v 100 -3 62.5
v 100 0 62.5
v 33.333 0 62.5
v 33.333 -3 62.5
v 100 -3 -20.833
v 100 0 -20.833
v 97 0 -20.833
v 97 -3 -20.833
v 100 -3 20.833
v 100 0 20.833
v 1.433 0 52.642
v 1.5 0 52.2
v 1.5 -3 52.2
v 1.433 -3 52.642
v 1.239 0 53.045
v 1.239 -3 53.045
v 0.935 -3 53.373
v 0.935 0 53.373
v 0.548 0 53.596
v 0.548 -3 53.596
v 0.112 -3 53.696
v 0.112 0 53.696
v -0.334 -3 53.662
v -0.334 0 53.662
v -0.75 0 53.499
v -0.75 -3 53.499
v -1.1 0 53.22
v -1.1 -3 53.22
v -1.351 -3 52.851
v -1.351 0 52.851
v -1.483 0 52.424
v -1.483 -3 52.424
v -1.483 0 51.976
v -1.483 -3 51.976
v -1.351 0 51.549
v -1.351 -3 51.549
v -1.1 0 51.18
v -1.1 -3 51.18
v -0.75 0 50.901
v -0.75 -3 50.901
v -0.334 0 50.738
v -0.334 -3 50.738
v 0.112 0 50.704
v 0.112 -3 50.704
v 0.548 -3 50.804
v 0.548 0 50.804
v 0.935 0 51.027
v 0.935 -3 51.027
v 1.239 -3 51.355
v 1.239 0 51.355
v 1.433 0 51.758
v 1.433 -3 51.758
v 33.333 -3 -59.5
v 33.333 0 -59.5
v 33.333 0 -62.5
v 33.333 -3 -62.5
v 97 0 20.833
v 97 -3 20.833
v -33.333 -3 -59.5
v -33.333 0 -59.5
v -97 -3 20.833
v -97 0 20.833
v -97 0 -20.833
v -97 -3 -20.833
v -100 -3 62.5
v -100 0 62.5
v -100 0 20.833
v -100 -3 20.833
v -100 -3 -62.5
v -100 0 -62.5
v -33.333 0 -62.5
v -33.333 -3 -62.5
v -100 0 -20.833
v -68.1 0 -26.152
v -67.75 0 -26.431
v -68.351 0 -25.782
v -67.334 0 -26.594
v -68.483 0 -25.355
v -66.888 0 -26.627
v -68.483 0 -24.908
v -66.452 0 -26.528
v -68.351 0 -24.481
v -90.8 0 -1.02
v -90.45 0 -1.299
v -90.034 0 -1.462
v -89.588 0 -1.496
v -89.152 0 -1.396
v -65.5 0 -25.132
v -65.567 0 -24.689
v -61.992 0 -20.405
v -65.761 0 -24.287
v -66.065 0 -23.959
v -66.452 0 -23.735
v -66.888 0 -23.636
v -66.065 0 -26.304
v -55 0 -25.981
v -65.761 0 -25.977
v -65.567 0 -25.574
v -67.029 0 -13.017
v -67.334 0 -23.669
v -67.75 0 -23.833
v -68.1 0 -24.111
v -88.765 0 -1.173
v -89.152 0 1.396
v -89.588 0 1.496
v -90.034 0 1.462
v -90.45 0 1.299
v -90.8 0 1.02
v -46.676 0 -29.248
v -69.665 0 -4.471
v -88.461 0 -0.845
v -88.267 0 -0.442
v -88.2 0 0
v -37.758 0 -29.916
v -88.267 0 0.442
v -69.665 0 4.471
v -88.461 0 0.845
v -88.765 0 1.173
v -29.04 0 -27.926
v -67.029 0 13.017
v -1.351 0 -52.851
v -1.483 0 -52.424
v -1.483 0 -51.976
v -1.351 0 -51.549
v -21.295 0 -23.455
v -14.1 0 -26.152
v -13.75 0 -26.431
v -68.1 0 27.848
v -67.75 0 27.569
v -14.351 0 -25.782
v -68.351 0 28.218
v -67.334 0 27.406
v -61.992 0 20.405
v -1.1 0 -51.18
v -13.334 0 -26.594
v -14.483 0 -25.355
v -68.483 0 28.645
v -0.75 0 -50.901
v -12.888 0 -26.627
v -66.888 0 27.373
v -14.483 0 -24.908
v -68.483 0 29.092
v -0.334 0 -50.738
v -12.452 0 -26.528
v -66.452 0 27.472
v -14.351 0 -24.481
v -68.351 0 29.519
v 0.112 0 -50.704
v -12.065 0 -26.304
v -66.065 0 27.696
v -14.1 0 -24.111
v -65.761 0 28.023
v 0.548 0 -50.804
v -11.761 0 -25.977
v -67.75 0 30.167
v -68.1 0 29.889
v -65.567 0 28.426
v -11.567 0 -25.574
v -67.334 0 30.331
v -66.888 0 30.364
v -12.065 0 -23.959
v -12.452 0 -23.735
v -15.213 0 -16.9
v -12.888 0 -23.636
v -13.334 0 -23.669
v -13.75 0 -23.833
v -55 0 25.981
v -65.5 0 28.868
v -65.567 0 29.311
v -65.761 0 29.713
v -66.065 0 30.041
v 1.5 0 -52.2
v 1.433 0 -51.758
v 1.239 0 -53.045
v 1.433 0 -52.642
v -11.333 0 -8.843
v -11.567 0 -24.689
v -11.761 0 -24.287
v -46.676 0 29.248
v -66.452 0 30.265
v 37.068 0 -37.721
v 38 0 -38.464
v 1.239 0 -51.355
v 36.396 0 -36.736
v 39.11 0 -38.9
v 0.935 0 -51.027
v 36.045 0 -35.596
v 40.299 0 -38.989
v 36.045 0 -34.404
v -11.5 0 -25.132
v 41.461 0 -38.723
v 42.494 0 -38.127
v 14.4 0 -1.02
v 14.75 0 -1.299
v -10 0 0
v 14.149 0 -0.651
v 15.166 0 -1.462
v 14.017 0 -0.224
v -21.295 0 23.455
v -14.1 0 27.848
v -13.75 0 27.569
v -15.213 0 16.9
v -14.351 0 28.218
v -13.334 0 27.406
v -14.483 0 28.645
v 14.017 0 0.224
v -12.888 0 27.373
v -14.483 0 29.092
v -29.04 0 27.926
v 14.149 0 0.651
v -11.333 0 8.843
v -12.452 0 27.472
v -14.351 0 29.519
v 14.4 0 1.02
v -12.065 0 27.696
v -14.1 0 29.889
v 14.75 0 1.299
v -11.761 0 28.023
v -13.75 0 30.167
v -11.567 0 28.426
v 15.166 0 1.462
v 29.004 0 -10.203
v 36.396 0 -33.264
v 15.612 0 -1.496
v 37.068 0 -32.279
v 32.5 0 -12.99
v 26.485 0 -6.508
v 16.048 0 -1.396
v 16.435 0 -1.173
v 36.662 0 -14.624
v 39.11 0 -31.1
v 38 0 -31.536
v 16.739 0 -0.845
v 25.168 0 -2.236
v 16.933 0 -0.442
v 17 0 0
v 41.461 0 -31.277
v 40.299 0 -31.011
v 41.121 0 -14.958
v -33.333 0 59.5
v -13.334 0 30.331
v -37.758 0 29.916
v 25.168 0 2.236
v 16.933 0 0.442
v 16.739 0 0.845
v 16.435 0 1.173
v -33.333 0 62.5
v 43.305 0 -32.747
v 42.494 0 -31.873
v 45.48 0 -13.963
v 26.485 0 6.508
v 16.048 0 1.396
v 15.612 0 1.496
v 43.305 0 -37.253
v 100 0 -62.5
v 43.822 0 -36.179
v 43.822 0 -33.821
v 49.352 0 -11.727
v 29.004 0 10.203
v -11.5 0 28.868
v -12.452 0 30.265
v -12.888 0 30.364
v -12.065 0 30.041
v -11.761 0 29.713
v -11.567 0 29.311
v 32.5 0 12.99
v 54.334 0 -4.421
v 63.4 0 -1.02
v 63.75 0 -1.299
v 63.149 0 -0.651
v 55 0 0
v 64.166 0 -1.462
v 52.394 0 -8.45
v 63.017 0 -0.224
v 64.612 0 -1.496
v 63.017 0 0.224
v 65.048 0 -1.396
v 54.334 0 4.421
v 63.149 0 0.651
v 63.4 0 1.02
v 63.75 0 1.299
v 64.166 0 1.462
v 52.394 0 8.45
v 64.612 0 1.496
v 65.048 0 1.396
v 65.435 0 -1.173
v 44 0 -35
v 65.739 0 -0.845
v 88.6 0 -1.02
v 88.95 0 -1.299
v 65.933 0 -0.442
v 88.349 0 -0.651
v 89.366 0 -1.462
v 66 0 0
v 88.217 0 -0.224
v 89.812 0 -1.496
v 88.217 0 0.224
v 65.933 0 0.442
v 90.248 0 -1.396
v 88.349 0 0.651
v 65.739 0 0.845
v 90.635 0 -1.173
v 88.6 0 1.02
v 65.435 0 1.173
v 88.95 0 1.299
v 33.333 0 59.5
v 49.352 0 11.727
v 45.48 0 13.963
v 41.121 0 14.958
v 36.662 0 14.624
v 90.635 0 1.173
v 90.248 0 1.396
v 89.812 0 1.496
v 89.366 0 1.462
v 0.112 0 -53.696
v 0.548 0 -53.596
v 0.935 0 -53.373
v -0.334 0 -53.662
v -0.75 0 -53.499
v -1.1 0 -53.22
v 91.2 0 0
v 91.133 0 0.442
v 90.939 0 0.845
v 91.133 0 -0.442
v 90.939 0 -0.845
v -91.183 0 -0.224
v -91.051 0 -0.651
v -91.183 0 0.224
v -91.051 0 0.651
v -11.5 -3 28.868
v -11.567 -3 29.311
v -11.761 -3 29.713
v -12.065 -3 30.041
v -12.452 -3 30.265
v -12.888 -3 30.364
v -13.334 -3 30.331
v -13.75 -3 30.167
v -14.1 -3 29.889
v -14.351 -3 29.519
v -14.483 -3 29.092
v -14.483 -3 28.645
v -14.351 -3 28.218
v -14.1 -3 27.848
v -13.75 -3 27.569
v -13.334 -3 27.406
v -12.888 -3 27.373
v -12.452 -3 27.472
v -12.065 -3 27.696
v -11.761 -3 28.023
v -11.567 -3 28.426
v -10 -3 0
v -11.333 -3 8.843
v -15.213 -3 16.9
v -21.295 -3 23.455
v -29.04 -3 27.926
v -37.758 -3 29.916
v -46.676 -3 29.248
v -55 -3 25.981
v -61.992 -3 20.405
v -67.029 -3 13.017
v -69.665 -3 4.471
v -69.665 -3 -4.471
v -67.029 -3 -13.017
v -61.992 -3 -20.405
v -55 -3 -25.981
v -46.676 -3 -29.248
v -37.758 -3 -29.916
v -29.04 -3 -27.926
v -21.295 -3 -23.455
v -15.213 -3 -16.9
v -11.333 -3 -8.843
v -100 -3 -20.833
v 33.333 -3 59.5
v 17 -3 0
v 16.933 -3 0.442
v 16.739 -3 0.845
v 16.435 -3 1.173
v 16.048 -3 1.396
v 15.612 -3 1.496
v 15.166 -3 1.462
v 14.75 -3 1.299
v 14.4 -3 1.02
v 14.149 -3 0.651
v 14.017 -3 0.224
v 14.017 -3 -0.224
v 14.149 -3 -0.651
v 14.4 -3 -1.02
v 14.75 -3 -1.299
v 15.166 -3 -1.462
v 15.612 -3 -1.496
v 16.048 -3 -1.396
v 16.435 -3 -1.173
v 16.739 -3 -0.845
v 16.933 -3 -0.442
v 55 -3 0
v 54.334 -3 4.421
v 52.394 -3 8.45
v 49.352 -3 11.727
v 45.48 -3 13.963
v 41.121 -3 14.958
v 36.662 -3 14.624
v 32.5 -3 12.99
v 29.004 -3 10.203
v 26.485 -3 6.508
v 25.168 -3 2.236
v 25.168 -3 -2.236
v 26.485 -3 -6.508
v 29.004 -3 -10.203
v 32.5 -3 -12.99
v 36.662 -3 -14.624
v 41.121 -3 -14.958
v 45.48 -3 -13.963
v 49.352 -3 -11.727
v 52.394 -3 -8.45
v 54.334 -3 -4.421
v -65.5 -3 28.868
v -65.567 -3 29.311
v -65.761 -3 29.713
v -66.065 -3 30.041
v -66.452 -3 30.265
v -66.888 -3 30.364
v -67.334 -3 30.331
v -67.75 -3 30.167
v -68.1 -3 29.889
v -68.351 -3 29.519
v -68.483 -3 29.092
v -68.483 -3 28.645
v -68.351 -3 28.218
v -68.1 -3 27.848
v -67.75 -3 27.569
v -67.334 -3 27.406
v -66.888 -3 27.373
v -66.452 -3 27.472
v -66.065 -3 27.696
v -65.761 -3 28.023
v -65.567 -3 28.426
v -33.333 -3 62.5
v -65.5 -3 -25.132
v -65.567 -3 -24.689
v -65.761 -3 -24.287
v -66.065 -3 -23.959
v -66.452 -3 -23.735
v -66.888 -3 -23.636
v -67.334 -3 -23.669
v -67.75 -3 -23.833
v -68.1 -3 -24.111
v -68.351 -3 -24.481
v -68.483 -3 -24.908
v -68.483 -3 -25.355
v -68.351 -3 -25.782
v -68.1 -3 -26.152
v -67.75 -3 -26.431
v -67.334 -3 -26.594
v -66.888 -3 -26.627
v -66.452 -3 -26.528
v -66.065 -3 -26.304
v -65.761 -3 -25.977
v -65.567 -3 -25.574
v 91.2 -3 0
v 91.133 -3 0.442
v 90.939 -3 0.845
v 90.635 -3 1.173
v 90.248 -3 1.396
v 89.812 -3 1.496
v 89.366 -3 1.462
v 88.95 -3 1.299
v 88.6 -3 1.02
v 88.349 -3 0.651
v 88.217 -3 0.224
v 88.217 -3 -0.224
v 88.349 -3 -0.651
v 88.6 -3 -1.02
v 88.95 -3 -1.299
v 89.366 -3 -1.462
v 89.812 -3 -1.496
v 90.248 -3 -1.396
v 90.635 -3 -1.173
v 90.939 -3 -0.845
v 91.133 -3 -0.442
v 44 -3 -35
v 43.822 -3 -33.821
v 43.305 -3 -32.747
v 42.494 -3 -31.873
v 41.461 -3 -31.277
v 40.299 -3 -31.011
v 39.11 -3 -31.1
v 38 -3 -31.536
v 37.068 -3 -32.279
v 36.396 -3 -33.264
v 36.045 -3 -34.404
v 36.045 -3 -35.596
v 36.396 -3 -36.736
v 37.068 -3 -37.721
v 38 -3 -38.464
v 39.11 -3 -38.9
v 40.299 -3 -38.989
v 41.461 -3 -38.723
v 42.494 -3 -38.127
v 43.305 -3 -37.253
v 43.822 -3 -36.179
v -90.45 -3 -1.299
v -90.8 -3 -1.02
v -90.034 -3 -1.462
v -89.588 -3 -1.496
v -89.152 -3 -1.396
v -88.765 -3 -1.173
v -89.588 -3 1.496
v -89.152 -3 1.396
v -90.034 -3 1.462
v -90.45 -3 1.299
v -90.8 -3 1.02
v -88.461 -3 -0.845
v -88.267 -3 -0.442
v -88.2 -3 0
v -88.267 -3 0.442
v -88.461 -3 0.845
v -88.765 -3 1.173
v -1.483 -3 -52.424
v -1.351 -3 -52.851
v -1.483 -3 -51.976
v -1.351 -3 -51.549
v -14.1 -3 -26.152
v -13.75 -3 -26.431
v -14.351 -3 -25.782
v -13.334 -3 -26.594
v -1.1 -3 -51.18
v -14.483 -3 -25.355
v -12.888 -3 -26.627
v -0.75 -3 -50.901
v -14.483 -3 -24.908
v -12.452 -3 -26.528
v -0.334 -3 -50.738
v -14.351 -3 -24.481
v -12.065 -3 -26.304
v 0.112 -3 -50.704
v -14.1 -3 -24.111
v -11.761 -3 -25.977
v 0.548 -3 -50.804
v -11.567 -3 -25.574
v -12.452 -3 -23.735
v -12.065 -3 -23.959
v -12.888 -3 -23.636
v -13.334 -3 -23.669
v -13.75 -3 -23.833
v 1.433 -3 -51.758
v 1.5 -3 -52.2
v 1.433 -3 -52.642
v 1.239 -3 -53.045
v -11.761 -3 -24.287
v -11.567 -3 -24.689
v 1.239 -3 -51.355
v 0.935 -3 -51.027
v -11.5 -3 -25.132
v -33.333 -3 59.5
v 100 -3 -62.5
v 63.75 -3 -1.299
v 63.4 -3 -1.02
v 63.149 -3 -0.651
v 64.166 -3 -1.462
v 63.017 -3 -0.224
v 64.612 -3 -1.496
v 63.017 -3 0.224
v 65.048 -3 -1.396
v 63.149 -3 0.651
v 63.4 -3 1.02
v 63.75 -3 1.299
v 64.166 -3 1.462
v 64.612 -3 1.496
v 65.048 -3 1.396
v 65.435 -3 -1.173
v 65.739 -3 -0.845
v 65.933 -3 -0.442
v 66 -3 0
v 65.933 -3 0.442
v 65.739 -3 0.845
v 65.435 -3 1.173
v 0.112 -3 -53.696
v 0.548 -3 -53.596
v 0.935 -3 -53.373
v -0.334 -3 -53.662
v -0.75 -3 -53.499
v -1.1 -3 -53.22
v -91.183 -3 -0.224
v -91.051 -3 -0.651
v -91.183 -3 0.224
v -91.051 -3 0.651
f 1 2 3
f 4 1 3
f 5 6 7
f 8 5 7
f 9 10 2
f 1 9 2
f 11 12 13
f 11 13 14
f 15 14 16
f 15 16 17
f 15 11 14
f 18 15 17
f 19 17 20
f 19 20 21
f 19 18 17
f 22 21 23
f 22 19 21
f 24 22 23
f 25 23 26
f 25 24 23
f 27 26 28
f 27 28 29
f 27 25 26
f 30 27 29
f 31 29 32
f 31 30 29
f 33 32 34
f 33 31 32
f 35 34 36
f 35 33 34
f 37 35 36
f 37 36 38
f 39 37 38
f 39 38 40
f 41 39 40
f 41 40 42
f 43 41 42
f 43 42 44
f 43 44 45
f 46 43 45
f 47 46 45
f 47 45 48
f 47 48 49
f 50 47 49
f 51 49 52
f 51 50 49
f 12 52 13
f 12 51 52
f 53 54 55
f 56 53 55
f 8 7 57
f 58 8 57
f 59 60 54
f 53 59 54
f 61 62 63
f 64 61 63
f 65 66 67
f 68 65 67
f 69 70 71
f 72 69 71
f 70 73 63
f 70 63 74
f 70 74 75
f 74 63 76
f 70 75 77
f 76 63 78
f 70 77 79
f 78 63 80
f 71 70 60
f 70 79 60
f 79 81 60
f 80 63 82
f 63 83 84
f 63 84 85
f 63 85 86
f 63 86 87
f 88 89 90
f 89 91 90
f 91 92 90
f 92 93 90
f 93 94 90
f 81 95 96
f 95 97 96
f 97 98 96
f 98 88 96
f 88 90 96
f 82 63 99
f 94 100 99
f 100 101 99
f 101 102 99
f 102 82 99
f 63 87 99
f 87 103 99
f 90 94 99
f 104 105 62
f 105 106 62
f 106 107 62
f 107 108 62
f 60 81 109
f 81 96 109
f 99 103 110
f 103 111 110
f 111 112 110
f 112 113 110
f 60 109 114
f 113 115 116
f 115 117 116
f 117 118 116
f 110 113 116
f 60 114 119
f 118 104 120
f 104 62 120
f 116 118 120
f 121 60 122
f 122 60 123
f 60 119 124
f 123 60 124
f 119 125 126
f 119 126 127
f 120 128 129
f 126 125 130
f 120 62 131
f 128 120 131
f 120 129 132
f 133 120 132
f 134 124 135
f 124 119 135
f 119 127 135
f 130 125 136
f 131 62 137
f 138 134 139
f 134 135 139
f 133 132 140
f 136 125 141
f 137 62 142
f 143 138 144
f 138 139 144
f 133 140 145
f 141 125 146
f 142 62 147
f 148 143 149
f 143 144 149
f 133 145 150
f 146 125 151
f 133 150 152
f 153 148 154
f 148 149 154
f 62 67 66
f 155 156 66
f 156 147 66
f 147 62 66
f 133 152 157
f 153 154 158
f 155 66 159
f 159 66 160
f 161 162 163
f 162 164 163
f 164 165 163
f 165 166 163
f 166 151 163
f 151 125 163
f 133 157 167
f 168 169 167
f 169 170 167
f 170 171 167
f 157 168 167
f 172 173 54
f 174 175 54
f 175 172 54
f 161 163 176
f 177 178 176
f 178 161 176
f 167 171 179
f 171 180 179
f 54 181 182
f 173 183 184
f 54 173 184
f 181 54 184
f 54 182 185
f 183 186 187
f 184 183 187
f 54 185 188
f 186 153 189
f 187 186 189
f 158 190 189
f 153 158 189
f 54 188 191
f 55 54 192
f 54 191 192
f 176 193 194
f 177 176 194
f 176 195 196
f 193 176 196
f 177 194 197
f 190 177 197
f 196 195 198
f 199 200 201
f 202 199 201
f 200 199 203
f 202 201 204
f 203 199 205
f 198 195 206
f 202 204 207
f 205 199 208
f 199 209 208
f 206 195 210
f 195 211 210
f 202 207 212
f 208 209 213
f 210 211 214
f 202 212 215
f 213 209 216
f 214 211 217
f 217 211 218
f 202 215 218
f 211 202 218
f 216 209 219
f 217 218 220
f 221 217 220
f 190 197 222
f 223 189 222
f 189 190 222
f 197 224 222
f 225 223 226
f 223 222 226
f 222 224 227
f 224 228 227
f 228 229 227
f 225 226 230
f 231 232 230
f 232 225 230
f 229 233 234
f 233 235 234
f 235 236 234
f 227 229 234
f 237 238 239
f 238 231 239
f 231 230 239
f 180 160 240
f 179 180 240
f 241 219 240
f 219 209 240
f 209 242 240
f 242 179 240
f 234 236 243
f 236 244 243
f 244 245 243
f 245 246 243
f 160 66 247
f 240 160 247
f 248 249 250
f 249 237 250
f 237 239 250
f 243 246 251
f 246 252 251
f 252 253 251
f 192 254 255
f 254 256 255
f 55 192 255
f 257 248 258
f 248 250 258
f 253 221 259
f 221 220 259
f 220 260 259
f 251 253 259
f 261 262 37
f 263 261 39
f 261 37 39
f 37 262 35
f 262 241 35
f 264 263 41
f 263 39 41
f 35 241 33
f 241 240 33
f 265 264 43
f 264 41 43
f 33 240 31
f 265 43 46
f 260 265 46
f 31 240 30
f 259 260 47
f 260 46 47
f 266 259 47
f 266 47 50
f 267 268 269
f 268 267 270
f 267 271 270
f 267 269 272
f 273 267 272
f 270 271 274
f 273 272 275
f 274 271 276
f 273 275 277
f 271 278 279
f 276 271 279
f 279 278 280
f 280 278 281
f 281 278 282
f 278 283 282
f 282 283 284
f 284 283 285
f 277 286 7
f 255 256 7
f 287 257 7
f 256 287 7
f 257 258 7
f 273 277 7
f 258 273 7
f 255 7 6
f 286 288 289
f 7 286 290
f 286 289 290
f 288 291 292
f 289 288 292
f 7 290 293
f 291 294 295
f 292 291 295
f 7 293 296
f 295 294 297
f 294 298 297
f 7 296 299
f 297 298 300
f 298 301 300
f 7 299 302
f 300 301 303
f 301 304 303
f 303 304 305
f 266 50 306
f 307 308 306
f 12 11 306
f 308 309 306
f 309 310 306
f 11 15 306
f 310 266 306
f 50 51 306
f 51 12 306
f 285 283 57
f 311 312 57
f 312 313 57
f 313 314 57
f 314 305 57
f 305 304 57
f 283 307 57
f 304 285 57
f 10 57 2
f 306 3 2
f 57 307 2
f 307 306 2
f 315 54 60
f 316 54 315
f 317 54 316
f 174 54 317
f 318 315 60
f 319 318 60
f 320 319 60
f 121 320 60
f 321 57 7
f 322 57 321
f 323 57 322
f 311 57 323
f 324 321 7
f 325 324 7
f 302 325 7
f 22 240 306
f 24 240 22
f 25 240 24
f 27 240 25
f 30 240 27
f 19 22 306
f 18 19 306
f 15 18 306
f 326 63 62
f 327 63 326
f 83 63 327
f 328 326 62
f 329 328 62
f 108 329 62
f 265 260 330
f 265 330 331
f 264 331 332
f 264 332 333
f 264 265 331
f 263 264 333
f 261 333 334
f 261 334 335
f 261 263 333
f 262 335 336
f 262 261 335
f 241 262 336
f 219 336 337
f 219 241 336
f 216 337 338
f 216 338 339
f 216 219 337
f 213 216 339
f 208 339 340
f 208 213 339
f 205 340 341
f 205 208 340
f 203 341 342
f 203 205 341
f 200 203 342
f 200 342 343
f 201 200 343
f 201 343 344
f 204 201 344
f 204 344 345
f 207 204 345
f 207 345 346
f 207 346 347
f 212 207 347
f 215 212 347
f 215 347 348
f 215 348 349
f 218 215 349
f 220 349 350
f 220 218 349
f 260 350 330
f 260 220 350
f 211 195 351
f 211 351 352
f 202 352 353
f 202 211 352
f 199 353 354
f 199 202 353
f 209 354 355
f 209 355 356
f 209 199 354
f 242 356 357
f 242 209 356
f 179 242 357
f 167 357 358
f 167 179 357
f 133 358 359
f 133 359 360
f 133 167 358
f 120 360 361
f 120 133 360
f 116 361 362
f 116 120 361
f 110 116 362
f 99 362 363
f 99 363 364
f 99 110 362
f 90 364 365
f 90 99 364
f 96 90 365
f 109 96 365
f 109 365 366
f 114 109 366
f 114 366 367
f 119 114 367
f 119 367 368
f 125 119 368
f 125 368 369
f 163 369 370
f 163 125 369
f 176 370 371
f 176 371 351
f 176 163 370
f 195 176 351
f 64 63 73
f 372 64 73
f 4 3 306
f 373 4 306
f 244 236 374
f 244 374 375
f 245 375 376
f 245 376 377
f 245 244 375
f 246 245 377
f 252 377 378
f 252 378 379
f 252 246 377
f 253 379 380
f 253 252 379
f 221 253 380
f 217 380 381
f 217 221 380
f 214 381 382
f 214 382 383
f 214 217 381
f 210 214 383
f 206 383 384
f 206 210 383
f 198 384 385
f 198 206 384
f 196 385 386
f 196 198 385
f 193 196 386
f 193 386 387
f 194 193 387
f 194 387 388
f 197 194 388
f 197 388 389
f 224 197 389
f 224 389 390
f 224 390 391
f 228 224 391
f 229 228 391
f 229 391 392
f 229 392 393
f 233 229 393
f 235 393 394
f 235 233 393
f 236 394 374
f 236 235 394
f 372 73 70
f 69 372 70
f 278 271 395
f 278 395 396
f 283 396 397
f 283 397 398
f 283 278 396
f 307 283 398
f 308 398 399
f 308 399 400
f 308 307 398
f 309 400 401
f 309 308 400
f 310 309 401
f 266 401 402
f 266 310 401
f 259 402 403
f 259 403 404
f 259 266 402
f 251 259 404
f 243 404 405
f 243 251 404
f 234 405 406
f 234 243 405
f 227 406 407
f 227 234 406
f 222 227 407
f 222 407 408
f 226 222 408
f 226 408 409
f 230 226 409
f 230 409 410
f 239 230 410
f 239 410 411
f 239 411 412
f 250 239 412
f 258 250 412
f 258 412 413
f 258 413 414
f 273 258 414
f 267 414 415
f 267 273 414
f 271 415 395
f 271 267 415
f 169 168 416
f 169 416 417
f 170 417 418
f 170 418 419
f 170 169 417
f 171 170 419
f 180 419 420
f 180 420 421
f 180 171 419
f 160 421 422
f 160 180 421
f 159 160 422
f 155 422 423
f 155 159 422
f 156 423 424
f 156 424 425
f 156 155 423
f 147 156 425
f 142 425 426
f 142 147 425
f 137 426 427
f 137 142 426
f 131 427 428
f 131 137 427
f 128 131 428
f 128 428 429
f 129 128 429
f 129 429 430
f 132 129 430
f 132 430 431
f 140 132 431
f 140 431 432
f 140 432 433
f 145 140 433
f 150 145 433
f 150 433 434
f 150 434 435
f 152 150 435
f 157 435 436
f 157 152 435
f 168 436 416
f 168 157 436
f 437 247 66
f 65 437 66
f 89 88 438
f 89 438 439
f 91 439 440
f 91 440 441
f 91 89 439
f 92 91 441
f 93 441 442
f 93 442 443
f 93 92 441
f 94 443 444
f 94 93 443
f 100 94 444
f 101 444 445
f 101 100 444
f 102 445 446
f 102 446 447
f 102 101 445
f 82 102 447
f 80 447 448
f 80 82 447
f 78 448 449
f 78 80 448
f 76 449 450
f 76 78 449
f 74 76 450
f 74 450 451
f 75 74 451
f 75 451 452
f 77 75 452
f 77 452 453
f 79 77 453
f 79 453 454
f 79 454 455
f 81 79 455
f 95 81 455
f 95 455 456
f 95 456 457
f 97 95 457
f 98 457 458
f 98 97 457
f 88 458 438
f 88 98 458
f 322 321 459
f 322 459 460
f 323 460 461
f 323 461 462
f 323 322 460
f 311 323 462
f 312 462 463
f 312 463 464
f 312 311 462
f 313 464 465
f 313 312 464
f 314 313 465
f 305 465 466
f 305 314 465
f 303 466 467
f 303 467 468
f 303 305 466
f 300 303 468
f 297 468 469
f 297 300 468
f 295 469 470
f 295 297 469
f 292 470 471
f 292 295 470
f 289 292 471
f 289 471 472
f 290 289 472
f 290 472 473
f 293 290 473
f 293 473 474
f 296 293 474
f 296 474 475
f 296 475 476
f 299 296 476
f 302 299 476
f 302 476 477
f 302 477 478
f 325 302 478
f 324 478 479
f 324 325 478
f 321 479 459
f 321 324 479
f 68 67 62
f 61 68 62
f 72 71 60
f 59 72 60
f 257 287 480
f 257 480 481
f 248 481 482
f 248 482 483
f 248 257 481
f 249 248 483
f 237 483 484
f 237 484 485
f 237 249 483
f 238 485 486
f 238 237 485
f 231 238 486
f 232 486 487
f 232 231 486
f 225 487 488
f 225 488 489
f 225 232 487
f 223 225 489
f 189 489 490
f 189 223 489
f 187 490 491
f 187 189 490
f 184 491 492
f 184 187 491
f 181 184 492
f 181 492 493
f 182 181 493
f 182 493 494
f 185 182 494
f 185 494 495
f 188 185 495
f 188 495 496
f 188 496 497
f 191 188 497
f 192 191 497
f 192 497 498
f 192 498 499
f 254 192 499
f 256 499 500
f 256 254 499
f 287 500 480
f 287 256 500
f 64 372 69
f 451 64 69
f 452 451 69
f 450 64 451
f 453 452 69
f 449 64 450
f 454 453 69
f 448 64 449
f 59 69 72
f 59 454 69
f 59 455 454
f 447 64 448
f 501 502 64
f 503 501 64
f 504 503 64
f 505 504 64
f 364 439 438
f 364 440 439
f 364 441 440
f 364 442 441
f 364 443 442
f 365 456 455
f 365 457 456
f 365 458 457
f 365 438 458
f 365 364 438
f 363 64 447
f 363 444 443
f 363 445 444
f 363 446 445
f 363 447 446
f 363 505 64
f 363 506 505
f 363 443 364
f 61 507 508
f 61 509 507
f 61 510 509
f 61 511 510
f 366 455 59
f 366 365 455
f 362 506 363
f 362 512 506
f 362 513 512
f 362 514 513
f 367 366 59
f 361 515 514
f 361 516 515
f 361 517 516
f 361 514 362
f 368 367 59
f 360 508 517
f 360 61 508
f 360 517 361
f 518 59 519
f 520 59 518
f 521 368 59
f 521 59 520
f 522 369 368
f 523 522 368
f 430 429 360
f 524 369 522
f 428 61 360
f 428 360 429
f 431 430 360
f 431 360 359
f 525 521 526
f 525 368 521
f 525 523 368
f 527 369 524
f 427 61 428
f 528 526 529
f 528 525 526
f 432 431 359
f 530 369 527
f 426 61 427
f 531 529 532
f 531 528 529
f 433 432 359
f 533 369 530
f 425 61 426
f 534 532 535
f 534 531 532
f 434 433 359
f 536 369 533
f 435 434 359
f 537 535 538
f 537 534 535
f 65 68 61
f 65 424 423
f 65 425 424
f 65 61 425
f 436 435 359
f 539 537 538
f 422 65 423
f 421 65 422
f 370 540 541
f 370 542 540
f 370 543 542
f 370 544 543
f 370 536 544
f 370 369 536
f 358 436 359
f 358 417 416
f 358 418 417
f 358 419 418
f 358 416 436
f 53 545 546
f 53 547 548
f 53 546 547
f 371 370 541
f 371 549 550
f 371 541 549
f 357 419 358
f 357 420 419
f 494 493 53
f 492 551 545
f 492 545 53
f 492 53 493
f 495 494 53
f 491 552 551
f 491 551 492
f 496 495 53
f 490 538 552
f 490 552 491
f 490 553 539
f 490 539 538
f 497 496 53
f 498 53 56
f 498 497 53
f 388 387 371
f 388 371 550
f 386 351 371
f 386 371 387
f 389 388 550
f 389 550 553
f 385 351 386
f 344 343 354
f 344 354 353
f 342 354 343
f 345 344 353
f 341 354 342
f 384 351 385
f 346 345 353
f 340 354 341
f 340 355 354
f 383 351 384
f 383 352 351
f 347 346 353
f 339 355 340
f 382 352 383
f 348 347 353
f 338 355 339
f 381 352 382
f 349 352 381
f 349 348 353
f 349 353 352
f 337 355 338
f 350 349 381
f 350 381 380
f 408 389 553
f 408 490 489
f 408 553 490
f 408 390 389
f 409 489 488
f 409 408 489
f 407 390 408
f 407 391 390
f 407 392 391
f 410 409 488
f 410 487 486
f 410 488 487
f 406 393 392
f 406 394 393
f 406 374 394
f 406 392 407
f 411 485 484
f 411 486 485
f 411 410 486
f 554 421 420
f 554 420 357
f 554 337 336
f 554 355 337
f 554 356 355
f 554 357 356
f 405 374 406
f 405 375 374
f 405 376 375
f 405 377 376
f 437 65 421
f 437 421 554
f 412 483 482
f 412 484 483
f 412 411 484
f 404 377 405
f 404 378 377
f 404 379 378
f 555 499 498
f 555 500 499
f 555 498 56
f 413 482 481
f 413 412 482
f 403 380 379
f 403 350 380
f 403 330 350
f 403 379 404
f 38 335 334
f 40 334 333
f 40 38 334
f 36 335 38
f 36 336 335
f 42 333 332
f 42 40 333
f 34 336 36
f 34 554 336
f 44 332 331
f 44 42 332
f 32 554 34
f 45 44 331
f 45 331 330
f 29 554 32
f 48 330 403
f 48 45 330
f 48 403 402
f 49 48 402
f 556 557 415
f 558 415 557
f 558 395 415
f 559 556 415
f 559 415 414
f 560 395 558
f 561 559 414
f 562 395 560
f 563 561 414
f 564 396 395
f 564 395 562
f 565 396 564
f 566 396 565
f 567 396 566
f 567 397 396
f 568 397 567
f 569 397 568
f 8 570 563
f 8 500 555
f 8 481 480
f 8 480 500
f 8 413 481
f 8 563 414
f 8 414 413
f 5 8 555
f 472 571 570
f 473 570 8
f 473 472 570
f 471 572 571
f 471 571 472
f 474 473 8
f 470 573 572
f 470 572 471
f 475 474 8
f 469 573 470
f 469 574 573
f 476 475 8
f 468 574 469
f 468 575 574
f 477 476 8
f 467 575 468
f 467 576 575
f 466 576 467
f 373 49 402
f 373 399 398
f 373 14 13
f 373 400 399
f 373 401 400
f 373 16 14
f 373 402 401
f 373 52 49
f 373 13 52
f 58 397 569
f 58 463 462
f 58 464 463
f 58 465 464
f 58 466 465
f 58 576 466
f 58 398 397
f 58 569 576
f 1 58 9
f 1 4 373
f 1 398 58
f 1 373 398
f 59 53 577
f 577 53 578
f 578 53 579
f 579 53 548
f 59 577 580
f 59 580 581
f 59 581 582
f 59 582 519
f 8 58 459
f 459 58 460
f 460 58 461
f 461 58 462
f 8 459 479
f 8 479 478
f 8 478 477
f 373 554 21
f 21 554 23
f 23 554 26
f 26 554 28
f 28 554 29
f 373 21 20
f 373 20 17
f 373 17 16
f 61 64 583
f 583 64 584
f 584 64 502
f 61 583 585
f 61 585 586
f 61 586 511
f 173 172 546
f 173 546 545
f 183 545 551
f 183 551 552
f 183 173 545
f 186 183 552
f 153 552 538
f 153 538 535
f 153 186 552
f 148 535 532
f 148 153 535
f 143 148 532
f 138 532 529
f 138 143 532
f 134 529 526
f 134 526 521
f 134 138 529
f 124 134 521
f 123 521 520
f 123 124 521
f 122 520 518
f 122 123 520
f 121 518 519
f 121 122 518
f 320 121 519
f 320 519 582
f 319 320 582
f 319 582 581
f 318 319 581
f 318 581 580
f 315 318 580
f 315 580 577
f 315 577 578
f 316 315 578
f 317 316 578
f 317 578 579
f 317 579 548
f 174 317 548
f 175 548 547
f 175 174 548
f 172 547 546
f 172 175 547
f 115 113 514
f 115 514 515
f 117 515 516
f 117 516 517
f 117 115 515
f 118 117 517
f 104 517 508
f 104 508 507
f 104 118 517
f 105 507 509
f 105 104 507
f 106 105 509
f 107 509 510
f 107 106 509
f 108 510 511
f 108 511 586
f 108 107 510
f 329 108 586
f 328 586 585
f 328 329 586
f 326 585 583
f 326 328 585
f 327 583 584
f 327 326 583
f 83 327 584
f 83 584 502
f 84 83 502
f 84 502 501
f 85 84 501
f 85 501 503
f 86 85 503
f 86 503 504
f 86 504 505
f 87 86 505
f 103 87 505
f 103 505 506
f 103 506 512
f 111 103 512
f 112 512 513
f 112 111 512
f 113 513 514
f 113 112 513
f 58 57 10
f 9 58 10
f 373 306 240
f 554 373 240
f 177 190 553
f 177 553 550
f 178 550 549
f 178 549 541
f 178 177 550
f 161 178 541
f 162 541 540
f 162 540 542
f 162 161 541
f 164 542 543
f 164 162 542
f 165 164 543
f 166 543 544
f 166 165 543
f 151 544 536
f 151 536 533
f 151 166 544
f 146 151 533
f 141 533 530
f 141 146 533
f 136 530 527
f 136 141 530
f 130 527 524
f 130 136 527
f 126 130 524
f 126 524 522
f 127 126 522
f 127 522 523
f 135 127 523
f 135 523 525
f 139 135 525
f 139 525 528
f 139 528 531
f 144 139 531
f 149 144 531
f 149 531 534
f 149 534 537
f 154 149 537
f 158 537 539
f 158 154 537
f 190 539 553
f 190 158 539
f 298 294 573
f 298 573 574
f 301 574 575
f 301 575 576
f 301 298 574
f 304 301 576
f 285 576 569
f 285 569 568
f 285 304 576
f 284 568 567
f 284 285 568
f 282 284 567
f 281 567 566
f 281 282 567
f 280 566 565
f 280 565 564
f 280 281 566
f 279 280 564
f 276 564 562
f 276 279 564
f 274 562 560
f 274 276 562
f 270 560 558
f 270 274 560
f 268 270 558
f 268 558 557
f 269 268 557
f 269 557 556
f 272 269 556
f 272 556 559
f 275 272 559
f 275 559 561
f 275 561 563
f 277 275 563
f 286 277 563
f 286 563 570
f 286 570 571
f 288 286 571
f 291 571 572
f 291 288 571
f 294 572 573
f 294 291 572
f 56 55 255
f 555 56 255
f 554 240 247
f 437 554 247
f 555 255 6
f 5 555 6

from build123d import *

# Parameters (mm, degrees)
F0_R     = 1.5
F0_R_2   = 4
F0_R_3   = 30
F0_R_4   = 15
F1_DEPTH = 3


with BuildPart() as f1:
    # F0 (on Front) → F1 (new body)
    with BuildSketch(Plane.XZ):
        Polygon((-100, -20.833333), (-100, -62.5), (-33.333333, -62.5), (-33.333333, -59.5), (33.333333, -59.5), (33.333333, -62.5), (100, -62.5), (100, -20.833333), (97, -20.833333), (97, 20.833333), (100, 20.833333), (100, 62.5), (33.333333, 62.5), (33.333333, 59.5), (-33.333333, 59.5), (-33.333333, 62.5), (-100, 62.5), (-100, 20.833333), (-97, 20.833333), (-97, -20.833333), align=None)
        with Locations((-67, -25.131546)):
            Circle(F0_R, mode=Mode.SUBTRACT)
        with Locations((-13, -25.131546)):
            Circle(F0_R, mode=Mode.SUBTRACT)
        with Locations((0, -52.2)):
            Circle(F0_R, mode=Mode.SUBTRACT)
        with Locations((40, -35)):
            Circle(F0_R_2, mode=Mode.SUBTRACT)
        with Locations((-89.7, 0)):
            Circle(F0_R, mode=Mode.SUBTRACT)
        with Locations((-67, 28.868454)):
            Circle(F0_R, mode=Mode.SUBTRACT)
        with Locations((-40, 0)):
            Circle(F0_R_3, mode=Mode.SUBTRACT)
        with Locations((-13, 28.868454)):
            Circle(F0_R, mode=Mode.SUBTRACT)
        with Locations((15.5, 0)):
            Circle(F0_R, mode=Mode.SUBTRACT)
        with Locations((40, 0)):
            Circle(F0_R_4, mode=Mode.SUBTRACT)
        with Locations((64.5, 0)):
            Circle(F0_R, mode=Mode.SUBTRACT)
        with Locations((89.7, 0)):
            Circle(F0_R, mode=Mode.SUBTRACT)
        with Locations((0, 52.2)):
            Circle(F0_R, mode=Mode.SUBTRACT)
    extrude(amount=F1_DEPTH)


with BuildPart() as f2_1:
    # F2: copy of F1
    add(f1.part.moved(Location((0, 60, 0))))


solid = f1.part
